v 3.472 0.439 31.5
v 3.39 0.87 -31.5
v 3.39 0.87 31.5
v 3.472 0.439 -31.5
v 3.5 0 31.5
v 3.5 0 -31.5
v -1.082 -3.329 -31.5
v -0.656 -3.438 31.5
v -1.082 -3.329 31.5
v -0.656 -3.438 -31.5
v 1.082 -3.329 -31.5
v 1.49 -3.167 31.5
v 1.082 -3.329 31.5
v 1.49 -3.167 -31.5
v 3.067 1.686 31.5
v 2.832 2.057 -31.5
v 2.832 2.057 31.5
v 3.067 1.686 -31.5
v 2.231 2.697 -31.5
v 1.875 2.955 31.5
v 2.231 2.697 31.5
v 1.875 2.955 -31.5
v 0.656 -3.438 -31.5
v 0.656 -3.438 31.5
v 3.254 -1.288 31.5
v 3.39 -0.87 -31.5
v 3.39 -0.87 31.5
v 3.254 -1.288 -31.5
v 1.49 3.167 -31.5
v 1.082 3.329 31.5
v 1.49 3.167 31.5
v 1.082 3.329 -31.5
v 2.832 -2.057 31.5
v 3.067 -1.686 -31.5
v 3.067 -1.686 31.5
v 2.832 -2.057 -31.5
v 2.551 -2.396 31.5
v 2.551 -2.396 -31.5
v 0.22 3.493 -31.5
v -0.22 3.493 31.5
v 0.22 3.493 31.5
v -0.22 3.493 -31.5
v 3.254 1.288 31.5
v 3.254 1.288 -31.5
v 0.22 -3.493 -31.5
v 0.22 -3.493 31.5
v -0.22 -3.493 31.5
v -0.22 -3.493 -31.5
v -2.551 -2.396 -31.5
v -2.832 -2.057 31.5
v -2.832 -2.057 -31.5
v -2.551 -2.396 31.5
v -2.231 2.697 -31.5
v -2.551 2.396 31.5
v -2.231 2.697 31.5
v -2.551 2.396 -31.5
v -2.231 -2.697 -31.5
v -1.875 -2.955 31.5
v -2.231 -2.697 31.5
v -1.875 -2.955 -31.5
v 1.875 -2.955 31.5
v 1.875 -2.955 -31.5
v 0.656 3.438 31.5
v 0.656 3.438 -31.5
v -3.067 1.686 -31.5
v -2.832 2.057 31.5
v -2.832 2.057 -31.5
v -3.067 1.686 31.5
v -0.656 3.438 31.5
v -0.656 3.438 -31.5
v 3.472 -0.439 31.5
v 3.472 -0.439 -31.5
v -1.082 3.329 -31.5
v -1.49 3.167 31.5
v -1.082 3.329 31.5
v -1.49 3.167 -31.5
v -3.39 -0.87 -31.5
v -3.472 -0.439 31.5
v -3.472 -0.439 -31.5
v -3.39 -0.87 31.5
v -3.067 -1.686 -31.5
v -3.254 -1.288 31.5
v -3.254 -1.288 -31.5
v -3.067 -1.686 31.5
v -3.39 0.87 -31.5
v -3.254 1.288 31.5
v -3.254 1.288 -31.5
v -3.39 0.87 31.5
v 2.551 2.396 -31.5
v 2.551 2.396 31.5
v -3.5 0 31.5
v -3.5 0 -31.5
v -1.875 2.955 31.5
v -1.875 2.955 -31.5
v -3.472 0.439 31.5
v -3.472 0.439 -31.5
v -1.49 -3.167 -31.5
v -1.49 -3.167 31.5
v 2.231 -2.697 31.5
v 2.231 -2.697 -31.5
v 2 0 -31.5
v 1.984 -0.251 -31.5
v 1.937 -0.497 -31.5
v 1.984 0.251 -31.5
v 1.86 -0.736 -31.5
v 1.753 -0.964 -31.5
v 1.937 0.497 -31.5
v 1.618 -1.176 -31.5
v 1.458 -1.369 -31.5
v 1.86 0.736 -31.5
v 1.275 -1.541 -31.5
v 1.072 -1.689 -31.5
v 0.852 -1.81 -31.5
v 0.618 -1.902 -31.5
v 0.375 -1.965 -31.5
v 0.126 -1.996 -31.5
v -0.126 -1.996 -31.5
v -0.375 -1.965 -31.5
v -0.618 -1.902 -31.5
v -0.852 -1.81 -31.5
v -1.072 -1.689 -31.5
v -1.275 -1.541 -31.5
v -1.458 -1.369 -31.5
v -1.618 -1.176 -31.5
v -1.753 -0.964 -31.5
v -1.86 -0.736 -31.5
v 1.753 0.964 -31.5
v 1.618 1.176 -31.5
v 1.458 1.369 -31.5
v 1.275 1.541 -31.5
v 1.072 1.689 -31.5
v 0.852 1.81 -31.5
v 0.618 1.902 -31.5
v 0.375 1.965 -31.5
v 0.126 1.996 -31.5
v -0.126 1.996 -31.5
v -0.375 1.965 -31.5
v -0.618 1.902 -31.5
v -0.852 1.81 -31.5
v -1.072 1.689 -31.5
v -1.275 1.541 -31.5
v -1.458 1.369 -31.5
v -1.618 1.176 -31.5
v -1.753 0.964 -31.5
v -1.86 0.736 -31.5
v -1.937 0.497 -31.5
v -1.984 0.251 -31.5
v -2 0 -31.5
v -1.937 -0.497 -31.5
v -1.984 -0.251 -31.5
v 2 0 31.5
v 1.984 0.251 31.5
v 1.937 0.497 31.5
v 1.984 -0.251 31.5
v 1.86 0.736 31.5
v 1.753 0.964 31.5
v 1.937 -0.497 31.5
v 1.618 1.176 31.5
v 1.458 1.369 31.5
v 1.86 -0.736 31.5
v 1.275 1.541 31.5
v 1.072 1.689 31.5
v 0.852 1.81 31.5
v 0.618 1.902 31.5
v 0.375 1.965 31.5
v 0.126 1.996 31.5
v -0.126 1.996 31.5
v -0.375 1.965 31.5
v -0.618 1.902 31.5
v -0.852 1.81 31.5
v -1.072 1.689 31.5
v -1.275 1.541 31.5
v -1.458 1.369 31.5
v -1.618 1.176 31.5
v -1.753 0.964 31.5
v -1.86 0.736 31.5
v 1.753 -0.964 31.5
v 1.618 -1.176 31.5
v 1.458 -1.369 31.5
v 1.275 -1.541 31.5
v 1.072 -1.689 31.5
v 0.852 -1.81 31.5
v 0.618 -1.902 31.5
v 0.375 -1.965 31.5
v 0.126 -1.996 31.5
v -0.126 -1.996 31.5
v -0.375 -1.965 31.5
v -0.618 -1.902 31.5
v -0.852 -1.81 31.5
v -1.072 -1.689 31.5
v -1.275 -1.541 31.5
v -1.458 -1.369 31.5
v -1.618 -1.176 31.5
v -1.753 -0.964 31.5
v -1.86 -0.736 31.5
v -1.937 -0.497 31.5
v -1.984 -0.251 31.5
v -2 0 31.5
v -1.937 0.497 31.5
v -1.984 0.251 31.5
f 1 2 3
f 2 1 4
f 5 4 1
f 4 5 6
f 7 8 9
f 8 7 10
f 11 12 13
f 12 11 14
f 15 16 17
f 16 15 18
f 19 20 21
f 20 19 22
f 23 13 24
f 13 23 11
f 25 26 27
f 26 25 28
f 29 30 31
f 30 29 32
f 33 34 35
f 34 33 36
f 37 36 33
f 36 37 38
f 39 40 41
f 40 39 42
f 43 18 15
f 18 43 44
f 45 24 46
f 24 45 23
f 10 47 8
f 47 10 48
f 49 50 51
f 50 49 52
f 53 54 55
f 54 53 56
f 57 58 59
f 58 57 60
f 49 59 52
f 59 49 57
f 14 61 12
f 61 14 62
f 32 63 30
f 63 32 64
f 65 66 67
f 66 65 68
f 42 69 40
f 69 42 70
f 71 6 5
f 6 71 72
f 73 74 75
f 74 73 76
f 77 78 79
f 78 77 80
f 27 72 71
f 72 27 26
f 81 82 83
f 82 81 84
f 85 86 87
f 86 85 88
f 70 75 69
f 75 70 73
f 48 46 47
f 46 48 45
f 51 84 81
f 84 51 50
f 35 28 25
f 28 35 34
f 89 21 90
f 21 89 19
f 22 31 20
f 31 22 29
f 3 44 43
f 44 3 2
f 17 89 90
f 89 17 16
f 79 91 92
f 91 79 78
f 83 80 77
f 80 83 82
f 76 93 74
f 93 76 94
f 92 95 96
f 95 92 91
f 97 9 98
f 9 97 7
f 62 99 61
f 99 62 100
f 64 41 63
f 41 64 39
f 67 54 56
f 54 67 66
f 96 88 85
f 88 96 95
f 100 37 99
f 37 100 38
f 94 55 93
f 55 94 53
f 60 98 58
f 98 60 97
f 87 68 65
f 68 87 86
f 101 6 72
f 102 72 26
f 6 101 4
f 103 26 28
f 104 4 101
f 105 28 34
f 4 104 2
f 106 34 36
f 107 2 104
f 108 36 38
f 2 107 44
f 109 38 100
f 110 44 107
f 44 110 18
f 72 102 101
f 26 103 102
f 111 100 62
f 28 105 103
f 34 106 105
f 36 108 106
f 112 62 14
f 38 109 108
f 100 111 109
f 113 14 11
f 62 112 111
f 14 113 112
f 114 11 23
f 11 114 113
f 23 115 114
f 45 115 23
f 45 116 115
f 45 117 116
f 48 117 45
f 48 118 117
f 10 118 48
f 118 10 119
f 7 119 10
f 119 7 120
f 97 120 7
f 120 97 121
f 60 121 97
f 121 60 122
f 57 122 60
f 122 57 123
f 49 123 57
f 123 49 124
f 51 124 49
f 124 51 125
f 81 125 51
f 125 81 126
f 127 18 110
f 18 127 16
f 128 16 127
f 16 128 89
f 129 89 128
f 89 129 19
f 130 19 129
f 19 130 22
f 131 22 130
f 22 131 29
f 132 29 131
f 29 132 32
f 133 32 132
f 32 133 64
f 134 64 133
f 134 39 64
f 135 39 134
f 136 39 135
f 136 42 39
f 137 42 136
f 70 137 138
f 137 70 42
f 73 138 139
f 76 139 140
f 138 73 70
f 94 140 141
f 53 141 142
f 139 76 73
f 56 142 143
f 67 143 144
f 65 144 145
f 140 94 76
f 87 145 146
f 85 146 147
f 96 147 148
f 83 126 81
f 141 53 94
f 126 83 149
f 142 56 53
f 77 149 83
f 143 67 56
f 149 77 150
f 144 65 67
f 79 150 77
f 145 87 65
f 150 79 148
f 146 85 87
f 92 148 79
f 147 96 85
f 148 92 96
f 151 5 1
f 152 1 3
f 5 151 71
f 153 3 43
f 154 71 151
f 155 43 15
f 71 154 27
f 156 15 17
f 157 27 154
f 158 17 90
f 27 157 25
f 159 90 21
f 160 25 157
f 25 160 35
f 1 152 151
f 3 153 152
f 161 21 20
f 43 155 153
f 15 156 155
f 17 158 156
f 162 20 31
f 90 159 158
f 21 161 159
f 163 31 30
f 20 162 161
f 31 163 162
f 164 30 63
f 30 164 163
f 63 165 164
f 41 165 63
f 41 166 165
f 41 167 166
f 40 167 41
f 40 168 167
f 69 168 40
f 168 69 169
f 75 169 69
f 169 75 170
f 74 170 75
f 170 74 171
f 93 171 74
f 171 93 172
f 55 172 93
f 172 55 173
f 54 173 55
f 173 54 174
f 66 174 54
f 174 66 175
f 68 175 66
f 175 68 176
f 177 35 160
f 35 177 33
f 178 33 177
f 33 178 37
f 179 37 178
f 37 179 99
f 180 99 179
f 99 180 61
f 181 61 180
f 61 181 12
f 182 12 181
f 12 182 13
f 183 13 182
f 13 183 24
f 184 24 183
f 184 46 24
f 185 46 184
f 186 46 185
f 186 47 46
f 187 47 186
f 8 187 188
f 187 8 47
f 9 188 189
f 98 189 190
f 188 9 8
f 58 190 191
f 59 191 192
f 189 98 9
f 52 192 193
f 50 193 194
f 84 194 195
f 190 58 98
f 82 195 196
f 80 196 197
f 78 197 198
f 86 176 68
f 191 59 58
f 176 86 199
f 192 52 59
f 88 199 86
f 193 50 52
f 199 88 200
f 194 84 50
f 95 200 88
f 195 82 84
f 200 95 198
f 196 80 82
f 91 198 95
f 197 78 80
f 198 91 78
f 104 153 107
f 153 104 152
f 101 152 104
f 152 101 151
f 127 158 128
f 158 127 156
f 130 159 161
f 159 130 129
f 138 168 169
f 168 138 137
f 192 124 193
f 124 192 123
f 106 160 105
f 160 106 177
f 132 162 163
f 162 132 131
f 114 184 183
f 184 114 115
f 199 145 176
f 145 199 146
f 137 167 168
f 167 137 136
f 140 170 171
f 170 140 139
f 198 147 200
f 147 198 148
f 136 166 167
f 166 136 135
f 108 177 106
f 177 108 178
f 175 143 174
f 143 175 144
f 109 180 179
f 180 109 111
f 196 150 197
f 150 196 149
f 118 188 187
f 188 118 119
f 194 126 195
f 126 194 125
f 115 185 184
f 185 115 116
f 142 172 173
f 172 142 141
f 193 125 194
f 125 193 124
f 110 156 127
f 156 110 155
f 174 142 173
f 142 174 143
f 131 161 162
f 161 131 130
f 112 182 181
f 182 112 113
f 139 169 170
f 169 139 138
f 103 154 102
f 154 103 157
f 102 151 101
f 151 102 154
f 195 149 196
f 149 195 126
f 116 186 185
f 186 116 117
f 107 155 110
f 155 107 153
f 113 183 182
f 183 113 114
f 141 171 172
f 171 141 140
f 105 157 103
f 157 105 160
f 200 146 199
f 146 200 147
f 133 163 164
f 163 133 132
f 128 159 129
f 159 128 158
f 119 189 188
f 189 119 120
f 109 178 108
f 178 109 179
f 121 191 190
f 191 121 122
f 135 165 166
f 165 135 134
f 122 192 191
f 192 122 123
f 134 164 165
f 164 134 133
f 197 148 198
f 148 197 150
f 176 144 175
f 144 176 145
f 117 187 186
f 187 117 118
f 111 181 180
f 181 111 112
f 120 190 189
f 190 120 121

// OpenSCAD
$fn = 50;


difference() {
	union() {
		translate(v = [0, 0, -31.5000000000]) {
			cylinder(h = 63, r = 3.5000000000);
		}
	}
	union() {
		translate(v = [0, 0, -100.0000000000]) {
			cylinder(h = 200, r = 2.0000000000);
		}
	}
}
